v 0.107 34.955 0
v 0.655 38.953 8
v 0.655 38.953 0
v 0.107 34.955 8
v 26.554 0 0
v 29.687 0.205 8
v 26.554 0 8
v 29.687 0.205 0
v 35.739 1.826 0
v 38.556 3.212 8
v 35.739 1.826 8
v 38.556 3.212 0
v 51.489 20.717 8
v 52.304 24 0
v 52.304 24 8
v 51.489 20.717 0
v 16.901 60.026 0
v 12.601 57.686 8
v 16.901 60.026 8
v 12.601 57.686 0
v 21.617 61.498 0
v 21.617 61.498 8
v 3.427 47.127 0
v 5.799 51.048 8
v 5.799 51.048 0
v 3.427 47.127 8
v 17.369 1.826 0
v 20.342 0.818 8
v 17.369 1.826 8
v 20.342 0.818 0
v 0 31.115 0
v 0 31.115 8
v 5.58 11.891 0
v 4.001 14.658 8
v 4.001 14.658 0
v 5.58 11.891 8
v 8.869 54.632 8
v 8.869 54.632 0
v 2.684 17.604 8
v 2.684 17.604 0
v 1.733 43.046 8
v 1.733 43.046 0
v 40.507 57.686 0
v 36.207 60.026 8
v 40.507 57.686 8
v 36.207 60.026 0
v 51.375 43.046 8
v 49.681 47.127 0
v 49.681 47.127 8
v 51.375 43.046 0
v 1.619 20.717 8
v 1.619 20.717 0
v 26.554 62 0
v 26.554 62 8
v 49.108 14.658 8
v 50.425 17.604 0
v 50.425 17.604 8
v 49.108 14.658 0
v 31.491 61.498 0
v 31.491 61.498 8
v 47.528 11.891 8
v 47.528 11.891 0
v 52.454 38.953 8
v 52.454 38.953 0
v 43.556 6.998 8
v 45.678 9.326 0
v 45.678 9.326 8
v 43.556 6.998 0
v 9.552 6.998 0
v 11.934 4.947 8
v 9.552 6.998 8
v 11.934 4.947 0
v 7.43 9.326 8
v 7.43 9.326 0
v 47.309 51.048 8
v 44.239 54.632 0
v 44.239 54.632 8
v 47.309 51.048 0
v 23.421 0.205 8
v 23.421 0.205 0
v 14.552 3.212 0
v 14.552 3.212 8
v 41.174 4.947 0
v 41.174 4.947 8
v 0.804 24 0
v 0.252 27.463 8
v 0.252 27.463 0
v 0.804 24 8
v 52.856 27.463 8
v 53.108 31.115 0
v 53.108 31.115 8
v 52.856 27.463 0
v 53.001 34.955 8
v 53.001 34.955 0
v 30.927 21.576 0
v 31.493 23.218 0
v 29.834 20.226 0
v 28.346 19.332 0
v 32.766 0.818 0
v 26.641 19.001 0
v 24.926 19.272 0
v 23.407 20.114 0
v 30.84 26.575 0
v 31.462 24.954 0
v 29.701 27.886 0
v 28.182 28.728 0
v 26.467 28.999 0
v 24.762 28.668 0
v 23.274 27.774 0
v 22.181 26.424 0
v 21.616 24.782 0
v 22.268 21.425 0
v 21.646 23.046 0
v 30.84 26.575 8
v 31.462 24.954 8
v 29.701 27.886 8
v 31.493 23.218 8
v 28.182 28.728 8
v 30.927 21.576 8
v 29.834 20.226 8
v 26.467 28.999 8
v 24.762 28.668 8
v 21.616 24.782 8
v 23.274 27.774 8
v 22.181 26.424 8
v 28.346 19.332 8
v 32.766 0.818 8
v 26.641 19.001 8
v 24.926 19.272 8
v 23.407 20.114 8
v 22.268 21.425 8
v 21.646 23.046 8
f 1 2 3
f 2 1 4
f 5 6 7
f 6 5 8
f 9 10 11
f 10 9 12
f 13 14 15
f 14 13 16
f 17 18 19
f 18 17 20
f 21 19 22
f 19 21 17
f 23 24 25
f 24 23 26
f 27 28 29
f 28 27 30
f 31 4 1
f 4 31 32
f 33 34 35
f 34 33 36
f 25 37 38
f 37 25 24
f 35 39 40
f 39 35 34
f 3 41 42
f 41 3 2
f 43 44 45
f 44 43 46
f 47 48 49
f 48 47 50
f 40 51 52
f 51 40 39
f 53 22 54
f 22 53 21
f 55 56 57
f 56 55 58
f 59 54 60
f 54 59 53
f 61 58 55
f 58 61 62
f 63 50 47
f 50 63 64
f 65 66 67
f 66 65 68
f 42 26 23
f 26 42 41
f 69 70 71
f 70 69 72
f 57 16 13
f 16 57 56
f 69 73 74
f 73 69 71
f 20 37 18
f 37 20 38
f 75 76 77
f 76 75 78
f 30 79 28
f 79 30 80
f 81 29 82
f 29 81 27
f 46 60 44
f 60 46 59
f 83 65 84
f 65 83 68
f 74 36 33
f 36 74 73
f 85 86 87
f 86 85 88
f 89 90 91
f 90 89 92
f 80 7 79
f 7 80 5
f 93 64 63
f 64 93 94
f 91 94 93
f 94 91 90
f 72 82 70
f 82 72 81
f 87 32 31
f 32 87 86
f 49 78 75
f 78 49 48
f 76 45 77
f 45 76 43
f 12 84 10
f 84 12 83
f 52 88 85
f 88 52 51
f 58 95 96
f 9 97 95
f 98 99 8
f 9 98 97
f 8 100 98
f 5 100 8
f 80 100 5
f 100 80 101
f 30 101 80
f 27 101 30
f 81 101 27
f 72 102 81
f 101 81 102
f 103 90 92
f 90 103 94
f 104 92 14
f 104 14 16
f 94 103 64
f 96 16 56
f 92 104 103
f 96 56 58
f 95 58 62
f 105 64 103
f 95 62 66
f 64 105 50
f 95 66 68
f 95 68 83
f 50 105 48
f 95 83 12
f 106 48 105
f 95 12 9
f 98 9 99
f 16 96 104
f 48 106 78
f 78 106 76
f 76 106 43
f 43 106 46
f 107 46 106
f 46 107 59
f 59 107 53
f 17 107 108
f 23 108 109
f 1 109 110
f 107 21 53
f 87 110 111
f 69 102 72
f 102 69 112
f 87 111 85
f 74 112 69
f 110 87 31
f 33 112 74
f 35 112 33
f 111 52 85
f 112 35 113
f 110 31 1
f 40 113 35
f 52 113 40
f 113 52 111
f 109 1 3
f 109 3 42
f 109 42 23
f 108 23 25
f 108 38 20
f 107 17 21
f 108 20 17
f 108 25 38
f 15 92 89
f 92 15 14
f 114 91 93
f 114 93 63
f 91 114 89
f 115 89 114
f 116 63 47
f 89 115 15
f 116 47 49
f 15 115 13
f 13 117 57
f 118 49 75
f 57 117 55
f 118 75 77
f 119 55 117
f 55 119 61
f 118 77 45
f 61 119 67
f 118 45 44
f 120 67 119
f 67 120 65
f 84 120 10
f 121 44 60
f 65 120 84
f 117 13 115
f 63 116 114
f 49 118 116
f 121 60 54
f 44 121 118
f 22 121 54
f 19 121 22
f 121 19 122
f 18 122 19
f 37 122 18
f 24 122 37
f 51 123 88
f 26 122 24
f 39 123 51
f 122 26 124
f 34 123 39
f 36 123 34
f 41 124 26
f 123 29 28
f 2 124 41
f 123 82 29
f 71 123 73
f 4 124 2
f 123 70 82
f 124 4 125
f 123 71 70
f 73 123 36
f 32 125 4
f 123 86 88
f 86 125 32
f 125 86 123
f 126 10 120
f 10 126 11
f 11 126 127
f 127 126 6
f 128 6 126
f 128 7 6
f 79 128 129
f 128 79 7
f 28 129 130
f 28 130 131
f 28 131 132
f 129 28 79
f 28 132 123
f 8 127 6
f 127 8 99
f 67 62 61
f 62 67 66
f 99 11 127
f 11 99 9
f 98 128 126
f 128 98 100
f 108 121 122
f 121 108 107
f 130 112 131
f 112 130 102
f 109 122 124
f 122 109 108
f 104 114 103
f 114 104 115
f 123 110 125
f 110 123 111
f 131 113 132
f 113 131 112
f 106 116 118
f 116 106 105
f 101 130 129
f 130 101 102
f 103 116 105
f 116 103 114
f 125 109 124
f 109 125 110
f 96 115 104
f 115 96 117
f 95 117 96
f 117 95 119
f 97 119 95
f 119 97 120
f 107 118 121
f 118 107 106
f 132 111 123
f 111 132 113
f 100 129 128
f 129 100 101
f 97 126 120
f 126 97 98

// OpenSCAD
$fn = 32;

// ----------------------------------------------------------------------
// Cam plate: single_lobe cam, base R24
// ----------------------------------------------------------------------

// --- parameters (mm) ---
base_r = 24;              // base circle radius
lobe_h = 14;              // cam lobe rise
bore_r = 5;               // shaft bore radius
plate_t = 8;              // plate thickness, Z (extrusion height)

profile = [[52.304, 24], [52.856, 27.463], [53.108, 31.115], [53.001, 34.955], [52.454, 38.953], [51.375, 43.046], [49.681, 47.127], [47.309, 51.048], [44.239, 54.632], [40.507, 57.686], [36.207, 60.026], [31.491, 61.498], [26.554, 62], [21.617, 61.498], [16.901, 60.026], [12.601, 57.686], [8.869, 54.632], [5.799, 51.048], [3.427, 47.127], [1.733, 43.046], [0.655, 38.953], [0.107, 34.955], [0, 31.115], [0.252, 27.463], [0.804, 24], [1.619, 20.717], [2.684, 17.604], [4.001, 14.658], [5.58, 11.891], [7.43, 9.326], [9.552, 6.998], [11.934, 4.947], [14.552, 3.212], [17.369, 1.826], [20.342, 0.818], [23.421, 0.205], [26.554, 0], [29.687, 0.205], [32.766, 0.818], [35.739, 1.826], [38.556, 3.212], [41.174, 4.947], [43.556, 6.998], [45.678, 9.326], [47.528, 11.891], [49.108, 14.658], [50.425, 17.604], [51.489, 20.717]];  // primary outline, 48 points, counter clockwise
void_1 = [[31.462, 24.954], [30.84, 26.575], [29.701, 27.886], [28.182, 28.728], [26.467, 28.999], [24.762, 28.668], [23.274, 27.774], [22.181, 26.424], [21.616, 24.782], [21.646, 23.046], [22.268, 21.425], [23.407, 20.114], [24.926, 19.272], [26.641, 19.001], [28.346, 19.332], [29.834, 20.226], [30.927, 21.576], [31.493, 23.218]];  // shaft bore, 18 points

// --- the one profile operation ---
difference() {
  linear_extrude(height = plate_t) polygon(points = profile);
  translate([0, 0, -1])
    linear_extrude(height = plate_t + 2) polygon(points = void_1);
}
